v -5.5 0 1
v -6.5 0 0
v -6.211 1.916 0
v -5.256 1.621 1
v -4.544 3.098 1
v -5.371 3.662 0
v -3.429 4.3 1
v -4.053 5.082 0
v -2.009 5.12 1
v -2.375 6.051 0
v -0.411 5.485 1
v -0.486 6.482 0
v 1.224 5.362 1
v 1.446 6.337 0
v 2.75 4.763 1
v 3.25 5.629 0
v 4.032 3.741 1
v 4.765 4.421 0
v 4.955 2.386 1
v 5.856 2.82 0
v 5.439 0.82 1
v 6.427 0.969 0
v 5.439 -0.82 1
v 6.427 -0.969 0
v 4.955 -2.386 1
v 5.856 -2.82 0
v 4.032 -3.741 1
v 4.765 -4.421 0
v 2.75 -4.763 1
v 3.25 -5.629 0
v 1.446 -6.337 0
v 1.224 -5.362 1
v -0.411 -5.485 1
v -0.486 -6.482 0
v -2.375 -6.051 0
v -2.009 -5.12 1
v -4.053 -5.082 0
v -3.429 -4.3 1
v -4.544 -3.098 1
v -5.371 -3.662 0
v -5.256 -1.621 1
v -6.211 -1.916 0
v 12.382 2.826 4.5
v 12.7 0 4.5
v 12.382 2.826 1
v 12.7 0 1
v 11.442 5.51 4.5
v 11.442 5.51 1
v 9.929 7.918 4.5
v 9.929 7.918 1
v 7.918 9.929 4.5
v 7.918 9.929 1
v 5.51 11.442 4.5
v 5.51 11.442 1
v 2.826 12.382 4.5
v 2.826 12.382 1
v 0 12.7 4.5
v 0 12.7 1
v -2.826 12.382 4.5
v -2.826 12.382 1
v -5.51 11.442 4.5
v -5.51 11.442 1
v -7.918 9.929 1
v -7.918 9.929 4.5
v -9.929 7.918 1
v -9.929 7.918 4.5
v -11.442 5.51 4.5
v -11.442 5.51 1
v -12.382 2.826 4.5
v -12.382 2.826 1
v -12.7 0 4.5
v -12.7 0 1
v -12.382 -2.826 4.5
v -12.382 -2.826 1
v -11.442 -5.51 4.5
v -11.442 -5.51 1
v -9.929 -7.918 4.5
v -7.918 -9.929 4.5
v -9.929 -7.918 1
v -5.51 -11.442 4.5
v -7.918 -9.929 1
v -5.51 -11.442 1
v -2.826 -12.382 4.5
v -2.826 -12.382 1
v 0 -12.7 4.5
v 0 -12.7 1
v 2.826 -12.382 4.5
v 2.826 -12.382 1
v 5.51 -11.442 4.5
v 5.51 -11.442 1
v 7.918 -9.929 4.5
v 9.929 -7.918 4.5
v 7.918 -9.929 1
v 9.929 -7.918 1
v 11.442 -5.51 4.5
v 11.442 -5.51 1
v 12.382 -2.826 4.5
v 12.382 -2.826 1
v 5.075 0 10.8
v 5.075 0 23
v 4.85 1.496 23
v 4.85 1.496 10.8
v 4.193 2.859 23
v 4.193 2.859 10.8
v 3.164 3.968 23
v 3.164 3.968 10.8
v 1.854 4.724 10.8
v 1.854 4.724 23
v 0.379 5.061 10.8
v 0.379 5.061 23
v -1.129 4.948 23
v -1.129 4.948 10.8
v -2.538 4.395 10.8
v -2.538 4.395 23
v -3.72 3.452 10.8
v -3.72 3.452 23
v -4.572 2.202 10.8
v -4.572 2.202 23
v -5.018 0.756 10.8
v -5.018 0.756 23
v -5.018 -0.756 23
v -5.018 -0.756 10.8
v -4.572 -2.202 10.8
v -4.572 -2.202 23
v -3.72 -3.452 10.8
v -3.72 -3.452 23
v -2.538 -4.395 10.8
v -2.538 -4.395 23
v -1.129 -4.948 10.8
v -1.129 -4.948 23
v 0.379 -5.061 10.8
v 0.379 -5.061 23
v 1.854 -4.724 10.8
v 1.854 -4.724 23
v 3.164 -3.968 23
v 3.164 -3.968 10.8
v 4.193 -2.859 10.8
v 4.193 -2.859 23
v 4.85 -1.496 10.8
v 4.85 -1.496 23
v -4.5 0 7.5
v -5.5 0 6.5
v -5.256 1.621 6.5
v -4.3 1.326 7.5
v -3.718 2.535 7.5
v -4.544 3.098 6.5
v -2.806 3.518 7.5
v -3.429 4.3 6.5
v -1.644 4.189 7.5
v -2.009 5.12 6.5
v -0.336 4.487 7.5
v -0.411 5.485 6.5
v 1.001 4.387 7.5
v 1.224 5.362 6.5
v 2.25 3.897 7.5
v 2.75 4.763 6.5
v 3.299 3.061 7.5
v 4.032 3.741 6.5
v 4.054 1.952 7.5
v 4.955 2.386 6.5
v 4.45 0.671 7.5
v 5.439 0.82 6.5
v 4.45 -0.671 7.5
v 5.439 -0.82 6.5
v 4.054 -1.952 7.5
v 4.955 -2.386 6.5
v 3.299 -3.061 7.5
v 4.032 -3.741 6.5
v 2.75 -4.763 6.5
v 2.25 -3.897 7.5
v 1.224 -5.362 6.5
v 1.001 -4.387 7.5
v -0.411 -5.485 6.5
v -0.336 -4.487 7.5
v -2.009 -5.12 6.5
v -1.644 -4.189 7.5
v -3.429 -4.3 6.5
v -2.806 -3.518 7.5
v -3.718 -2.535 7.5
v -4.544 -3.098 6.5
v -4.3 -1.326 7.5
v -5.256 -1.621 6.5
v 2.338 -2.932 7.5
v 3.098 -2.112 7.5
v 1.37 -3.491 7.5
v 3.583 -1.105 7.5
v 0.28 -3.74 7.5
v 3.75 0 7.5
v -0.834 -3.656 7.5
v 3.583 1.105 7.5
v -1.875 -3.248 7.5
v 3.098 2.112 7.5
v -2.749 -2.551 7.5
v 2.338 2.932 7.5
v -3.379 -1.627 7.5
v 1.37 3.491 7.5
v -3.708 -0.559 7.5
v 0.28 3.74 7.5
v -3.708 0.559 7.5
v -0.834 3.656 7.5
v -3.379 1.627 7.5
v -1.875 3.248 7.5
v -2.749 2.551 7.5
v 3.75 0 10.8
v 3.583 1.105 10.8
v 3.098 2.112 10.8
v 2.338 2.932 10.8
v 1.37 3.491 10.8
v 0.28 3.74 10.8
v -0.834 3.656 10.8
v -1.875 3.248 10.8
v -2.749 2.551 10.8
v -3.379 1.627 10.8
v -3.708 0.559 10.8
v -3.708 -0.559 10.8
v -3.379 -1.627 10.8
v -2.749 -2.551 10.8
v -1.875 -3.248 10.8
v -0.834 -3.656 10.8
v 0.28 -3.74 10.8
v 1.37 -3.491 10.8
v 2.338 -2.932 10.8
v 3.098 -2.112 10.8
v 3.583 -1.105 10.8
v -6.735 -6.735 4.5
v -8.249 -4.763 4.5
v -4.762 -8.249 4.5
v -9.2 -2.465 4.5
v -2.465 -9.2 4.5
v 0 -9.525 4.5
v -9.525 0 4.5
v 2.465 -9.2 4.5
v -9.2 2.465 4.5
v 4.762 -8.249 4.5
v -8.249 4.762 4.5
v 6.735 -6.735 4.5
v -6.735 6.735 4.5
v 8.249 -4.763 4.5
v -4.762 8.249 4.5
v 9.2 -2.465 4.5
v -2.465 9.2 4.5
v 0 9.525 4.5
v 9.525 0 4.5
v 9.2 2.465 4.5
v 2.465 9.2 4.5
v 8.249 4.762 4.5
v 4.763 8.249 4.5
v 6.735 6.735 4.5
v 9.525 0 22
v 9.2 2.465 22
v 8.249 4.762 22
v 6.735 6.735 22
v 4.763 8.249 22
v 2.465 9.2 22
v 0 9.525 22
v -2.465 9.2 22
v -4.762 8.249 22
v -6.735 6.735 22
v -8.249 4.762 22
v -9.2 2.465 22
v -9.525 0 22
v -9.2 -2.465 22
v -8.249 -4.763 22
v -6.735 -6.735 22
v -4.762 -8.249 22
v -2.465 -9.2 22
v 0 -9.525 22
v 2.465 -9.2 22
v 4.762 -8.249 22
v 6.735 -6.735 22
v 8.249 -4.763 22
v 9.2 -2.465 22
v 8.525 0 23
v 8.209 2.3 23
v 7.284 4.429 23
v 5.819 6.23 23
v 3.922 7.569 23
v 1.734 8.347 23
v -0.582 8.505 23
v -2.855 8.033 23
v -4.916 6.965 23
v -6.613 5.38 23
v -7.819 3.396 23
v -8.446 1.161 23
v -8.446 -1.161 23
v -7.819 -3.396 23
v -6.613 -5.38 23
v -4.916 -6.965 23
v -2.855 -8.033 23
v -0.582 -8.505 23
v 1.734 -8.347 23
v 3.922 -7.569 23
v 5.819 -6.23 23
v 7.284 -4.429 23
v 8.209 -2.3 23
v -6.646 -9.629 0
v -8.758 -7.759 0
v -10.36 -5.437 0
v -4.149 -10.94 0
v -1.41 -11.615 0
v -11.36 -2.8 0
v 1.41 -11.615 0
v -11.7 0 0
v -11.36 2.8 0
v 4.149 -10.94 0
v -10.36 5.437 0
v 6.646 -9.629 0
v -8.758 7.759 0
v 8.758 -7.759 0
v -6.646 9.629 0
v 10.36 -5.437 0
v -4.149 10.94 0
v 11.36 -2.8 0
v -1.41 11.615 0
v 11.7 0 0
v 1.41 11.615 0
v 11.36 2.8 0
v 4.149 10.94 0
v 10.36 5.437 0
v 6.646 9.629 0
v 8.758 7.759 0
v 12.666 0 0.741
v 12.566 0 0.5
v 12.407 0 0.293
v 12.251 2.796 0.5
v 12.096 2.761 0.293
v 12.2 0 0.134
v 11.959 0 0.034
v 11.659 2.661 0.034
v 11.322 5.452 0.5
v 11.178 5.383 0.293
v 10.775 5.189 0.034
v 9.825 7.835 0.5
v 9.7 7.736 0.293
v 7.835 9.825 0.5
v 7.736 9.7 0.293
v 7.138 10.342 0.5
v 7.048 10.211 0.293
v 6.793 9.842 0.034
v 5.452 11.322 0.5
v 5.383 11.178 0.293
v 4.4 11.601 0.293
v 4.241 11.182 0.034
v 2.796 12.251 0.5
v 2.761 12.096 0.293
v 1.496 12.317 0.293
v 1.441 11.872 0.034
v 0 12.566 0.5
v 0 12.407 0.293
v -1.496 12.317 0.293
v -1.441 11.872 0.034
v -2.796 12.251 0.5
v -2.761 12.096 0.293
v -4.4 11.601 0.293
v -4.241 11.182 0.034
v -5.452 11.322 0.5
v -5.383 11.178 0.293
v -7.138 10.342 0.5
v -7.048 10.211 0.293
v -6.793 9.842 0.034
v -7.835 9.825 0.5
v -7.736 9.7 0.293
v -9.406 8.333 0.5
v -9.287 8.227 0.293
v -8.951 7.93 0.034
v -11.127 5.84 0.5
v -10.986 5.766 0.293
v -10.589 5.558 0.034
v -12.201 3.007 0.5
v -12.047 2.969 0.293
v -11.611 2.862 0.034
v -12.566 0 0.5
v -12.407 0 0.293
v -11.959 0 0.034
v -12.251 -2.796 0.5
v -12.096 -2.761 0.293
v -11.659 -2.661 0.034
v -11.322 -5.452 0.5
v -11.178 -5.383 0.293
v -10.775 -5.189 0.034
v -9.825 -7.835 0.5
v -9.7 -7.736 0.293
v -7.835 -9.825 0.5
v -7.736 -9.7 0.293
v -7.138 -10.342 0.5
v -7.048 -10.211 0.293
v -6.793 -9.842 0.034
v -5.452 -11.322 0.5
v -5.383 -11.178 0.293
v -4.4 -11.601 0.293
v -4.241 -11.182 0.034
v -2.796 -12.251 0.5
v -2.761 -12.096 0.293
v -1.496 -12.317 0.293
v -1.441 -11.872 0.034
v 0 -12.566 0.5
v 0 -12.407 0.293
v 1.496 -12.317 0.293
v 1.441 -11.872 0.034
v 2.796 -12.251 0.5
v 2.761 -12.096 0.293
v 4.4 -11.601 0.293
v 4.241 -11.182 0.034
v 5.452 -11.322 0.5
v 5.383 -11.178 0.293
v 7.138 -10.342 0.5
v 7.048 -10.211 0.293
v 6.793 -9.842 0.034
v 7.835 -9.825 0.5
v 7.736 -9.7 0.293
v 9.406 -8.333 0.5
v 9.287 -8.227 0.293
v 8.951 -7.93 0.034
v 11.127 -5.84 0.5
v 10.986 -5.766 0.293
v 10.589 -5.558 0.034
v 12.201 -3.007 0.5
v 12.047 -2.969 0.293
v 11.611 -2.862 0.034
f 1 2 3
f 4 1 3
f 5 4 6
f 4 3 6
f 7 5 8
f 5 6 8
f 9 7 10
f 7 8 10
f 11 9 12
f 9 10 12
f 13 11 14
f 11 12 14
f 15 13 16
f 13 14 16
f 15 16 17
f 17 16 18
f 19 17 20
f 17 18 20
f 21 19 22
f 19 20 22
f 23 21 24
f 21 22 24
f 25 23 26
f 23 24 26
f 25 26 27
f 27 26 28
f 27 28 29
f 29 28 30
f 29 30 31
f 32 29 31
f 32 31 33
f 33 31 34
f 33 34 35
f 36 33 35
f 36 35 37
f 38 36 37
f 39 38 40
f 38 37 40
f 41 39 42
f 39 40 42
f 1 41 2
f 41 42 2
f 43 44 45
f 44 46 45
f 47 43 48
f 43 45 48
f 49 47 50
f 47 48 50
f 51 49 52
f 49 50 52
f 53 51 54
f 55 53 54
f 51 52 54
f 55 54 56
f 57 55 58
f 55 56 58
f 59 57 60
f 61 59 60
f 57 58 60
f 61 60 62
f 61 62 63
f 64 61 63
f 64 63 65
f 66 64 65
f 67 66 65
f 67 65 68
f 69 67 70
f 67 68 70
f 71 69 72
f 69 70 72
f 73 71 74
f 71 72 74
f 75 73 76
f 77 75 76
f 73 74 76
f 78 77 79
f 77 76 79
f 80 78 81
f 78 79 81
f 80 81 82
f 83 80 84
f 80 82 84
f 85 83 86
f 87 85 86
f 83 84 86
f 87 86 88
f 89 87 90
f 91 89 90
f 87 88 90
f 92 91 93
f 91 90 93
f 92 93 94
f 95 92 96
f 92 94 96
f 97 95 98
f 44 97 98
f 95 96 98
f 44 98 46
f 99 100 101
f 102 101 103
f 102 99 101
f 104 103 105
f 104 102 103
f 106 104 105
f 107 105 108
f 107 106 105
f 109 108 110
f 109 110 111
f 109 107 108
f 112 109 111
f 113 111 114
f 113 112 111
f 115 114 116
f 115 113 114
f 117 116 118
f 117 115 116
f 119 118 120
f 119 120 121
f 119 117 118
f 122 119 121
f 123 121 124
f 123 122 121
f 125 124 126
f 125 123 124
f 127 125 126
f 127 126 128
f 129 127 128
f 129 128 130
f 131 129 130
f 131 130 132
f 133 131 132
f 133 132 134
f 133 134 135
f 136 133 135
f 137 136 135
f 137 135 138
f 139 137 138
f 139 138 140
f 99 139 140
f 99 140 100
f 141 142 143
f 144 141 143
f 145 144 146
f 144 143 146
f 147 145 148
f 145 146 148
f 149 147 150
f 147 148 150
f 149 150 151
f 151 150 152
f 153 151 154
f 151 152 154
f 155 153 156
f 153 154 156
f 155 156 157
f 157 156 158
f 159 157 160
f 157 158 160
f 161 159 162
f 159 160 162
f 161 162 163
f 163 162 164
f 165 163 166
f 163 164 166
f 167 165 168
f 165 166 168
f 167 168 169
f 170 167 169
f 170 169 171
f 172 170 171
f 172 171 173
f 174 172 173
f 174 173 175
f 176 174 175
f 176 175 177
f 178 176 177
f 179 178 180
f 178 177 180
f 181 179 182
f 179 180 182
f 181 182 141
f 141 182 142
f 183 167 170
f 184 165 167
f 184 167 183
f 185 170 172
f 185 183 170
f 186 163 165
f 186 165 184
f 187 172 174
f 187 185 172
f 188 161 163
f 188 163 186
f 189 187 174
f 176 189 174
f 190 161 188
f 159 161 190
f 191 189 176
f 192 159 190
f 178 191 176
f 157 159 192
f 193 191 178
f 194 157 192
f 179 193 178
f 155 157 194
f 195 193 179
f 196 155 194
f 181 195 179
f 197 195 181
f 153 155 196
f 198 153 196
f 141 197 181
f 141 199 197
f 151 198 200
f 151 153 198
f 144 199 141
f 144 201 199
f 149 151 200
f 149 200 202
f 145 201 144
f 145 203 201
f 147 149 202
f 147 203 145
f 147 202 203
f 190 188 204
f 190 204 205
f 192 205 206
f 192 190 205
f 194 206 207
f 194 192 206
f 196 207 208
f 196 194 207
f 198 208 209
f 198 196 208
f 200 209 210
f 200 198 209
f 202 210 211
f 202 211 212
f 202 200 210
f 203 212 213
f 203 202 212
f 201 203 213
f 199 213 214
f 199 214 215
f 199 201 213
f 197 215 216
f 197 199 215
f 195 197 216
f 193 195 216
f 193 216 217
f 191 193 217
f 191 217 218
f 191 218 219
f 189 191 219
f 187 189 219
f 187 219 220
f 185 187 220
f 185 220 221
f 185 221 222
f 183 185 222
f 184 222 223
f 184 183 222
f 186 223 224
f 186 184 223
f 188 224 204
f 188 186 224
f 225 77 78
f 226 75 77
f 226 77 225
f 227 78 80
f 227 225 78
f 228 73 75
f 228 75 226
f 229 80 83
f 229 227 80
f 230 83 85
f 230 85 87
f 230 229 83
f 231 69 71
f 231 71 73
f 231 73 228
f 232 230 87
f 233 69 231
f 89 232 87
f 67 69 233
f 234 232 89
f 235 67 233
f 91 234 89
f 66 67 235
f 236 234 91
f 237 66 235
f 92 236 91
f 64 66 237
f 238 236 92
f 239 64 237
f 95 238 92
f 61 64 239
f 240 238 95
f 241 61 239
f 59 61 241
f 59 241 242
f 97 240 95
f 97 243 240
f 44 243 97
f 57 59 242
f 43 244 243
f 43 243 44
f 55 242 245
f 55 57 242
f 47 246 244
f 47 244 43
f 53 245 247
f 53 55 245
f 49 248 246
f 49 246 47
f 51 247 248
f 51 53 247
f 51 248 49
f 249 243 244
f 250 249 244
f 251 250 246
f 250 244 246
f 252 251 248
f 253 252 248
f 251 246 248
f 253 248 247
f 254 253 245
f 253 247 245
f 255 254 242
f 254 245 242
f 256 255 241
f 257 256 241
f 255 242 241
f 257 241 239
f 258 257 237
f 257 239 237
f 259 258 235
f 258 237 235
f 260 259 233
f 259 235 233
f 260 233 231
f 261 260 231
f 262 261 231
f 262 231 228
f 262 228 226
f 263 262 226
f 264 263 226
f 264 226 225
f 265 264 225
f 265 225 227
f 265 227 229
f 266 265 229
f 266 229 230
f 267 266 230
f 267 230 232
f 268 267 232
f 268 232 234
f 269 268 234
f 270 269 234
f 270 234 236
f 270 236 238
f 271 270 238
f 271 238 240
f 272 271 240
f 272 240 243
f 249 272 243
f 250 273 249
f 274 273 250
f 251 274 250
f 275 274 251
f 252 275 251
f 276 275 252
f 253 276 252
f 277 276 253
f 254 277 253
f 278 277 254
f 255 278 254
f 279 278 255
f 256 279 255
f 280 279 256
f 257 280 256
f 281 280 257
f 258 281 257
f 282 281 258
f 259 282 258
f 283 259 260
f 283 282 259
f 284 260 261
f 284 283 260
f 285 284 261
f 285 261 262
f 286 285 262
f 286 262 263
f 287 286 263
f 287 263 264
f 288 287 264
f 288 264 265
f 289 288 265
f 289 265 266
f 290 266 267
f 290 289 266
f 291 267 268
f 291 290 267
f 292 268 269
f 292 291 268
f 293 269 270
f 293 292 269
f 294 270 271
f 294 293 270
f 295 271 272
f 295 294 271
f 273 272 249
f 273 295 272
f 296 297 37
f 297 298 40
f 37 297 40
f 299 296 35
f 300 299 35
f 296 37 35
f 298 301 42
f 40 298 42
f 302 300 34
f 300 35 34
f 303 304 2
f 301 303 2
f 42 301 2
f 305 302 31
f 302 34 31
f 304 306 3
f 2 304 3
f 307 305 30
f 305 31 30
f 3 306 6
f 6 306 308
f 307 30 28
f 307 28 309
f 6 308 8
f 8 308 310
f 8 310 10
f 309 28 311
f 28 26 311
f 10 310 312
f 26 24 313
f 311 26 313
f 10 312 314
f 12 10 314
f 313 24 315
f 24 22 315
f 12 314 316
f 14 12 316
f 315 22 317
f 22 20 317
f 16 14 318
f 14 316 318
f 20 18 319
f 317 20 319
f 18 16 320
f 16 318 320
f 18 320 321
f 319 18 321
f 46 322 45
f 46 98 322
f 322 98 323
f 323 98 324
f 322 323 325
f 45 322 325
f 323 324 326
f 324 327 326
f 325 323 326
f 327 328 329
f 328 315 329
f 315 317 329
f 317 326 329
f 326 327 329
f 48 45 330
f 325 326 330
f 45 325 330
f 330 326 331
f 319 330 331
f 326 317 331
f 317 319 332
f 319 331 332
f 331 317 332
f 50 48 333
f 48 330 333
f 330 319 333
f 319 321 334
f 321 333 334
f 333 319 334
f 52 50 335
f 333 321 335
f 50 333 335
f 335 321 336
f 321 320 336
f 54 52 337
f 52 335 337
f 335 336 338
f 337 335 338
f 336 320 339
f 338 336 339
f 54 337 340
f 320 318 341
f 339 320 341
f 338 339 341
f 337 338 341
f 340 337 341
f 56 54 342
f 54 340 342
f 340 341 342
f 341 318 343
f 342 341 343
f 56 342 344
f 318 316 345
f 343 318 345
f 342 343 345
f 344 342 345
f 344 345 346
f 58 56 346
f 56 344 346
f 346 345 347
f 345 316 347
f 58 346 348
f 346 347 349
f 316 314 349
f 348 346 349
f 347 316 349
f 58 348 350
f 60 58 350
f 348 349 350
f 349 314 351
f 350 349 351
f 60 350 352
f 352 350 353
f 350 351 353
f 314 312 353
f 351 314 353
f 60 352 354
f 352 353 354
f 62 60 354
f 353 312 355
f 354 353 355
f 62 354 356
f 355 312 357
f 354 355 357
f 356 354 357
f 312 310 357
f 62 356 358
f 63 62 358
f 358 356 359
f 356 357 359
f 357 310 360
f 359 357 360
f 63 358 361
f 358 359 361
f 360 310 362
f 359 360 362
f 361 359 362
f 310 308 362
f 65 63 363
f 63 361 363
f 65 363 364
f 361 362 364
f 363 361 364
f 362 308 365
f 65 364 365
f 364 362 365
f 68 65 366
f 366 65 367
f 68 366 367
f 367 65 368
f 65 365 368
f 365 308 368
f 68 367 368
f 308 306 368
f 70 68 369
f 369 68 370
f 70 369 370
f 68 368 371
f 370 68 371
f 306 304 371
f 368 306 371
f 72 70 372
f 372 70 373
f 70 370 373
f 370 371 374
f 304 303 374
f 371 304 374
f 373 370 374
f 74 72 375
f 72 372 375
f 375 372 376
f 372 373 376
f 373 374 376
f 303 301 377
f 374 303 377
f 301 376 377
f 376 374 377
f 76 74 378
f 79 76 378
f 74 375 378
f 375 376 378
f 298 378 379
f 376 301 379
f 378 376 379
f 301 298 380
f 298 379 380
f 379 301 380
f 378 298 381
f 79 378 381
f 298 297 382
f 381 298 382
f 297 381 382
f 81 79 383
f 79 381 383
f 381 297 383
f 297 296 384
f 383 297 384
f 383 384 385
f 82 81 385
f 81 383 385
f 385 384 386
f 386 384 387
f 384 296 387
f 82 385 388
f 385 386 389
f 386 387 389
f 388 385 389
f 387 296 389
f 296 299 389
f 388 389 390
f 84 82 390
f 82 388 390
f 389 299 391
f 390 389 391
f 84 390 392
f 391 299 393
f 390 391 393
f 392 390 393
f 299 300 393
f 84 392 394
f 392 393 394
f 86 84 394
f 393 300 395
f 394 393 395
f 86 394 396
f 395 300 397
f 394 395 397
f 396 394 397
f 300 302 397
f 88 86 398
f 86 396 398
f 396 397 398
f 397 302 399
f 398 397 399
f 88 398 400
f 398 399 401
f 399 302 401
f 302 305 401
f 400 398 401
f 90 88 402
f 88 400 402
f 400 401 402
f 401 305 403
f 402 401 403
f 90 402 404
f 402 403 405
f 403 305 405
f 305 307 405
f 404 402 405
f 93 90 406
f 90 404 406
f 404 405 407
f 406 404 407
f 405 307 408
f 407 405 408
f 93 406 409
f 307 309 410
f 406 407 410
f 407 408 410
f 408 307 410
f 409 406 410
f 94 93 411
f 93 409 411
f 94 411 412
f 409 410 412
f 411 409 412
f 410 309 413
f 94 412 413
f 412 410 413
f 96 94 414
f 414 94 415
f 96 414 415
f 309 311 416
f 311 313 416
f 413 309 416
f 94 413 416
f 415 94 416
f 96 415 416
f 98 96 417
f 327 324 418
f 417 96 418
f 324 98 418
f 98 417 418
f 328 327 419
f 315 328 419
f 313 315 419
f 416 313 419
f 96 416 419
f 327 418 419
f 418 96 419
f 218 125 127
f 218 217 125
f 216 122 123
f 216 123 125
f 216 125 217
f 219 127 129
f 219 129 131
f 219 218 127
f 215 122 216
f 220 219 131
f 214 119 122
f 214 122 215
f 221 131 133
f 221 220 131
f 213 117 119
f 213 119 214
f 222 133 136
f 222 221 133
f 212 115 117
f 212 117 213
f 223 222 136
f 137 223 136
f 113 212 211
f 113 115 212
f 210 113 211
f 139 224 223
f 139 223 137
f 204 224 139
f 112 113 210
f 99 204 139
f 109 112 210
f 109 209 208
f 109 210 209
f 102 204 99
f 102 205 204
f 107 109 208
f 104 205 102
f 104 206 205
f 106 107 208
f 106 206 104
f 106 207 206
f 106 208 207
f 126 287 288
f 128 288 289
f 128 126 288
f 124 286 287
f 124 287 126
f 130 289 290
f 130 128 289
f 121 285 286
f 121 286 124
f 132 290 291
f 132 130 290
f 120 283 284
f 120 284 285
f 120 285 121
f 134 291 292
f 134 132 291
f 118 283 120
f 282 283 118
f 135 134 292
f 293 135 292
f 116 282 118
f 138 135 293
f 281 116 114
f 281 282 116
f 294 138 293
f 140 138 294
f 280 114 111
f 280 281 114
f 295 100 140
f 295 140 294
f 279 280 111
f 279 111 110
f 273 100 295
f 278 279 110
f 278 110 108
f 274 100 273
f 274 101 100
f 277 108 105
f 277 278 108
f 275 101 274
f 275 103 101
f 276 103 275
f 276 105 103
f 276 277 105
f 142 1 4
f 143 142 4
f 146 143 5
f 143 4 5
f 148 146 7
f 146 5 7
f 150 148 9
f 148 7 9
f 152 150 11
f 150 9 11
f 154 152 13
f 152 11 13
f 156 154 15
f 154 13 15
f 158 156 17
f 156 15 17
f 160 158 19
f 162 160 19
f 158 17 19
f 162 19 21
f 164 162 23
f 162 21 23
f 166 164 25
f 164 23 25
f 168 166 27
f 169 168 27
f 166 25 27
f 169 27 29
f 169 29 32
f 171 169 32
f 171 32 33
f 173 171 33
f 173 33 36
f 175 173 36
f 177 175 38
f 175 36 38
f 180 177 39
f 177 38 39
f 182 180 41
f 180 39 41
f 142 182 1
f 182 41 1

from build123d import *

# Parameters (mm, degrees)
SKETCH_1_R          = 12.7
SKETCH_1_R_2        = 3.75
EXTRUDE_1_DEPTH     = 3
SKETCH_2_R          = 9.525
SKETCH_2_R_2        = 5.075
EXTRUDE_2_DEPTH     = 20
CHAMFER_1_SIZE      = 1
FILLET_1_R          = 1
SKETCH_3_R          = 12.7
SKETCH_3_R_2        = 9.525
EXTRUDE_3_DEPTH     = 1.5
SKETCH_4_R          = 5.075
SKETCH_4_R_2        = 3.75
EXTRUDE_4_DEPTH     = 7.8
SKETCH_5_R          = 5.5
CUT_EXTRUDE_1_DEPTH = 7.5
CHAMFER_2_SIZE      = 1


with BuildPart() as part:
    # 스케치1 → 보스-돌출1 (new body)
    with BuildSketch(Plane.XY):
        Circle(SKETCH_1_R)
        Circle(SKETCH_1_R_2, mode=Mode.SUBTRACT)
    extrude(amount=EXTRUDE_1_DEPTH)

    # 스케치2 → 보스-돌출2 (add)
    with BuildSketch(Plane.XY.offset(3)):
        Circle(SKETCH_2_R)
        Circle(SKETCH_2_R_2, mode=Mode.SUBTRACT)
    extrude(amount=EXTRUDE_2_DEPTH)

    # 모따기1
    chamfer_1_edges = [part.edges().sort_by_distance(p)[0] for p in [
        (-9.525, 0, 23),
    ]]
    chamfer(chamfer_1_edges, length=CHAMFER_1_SIZE)

    # 필렛1
    fillet_1_edges = [part.edges().sort_by_distance(p)[0] for p in [
        (-12.7, 0, 0),
    ]]
    fillet(fillet_1_edges, radius=FILLET_1_R)

    # 스케치3 → 보스-돌출3 (add)
    with BuildSketch(Plane.XY.offset(3)):
        Circle(SKETCH_3_R)
        Circle(SKETCH_3_R_2, mode=Mode.SUBTRACT)
    extrude(amount=EXTRUDE_3_DEPTH)

    # 스케치4 → 보스-돌출4 (add)
    with BuildSketch(Plane.XY.offset(3)):
        Circle(SKETCH_4_R)
        Circle(SKETCH_4_R_2, mode=Mode.SUBTRACT)
    extrude(amount=EXTRUDE_4_DEPTH)

    # 스케치5 → 컷-돌출1 (cut)
    with BuildSketch(Plane(origin=(0, 0, 0), x_dir=(-1, 0, 0), z_dir=(0, 0, -1))):
        Circle(SKETCH_5_R)
    extrude(amount=-CUT_EXTRUDE_1_DEPTH, mode=Mode.SUBTRACT)

    # 모따기2
    chamfer_2_edges = [part.edges().sort_by_distance(p)[0] for p in [
        (5.5, 0, 7.5),
        (5.5, 0, 0),
    ]]
    chamfer(chamfer_2_edges, length=CHAMFER_2_SIZE)


solid = part.part
